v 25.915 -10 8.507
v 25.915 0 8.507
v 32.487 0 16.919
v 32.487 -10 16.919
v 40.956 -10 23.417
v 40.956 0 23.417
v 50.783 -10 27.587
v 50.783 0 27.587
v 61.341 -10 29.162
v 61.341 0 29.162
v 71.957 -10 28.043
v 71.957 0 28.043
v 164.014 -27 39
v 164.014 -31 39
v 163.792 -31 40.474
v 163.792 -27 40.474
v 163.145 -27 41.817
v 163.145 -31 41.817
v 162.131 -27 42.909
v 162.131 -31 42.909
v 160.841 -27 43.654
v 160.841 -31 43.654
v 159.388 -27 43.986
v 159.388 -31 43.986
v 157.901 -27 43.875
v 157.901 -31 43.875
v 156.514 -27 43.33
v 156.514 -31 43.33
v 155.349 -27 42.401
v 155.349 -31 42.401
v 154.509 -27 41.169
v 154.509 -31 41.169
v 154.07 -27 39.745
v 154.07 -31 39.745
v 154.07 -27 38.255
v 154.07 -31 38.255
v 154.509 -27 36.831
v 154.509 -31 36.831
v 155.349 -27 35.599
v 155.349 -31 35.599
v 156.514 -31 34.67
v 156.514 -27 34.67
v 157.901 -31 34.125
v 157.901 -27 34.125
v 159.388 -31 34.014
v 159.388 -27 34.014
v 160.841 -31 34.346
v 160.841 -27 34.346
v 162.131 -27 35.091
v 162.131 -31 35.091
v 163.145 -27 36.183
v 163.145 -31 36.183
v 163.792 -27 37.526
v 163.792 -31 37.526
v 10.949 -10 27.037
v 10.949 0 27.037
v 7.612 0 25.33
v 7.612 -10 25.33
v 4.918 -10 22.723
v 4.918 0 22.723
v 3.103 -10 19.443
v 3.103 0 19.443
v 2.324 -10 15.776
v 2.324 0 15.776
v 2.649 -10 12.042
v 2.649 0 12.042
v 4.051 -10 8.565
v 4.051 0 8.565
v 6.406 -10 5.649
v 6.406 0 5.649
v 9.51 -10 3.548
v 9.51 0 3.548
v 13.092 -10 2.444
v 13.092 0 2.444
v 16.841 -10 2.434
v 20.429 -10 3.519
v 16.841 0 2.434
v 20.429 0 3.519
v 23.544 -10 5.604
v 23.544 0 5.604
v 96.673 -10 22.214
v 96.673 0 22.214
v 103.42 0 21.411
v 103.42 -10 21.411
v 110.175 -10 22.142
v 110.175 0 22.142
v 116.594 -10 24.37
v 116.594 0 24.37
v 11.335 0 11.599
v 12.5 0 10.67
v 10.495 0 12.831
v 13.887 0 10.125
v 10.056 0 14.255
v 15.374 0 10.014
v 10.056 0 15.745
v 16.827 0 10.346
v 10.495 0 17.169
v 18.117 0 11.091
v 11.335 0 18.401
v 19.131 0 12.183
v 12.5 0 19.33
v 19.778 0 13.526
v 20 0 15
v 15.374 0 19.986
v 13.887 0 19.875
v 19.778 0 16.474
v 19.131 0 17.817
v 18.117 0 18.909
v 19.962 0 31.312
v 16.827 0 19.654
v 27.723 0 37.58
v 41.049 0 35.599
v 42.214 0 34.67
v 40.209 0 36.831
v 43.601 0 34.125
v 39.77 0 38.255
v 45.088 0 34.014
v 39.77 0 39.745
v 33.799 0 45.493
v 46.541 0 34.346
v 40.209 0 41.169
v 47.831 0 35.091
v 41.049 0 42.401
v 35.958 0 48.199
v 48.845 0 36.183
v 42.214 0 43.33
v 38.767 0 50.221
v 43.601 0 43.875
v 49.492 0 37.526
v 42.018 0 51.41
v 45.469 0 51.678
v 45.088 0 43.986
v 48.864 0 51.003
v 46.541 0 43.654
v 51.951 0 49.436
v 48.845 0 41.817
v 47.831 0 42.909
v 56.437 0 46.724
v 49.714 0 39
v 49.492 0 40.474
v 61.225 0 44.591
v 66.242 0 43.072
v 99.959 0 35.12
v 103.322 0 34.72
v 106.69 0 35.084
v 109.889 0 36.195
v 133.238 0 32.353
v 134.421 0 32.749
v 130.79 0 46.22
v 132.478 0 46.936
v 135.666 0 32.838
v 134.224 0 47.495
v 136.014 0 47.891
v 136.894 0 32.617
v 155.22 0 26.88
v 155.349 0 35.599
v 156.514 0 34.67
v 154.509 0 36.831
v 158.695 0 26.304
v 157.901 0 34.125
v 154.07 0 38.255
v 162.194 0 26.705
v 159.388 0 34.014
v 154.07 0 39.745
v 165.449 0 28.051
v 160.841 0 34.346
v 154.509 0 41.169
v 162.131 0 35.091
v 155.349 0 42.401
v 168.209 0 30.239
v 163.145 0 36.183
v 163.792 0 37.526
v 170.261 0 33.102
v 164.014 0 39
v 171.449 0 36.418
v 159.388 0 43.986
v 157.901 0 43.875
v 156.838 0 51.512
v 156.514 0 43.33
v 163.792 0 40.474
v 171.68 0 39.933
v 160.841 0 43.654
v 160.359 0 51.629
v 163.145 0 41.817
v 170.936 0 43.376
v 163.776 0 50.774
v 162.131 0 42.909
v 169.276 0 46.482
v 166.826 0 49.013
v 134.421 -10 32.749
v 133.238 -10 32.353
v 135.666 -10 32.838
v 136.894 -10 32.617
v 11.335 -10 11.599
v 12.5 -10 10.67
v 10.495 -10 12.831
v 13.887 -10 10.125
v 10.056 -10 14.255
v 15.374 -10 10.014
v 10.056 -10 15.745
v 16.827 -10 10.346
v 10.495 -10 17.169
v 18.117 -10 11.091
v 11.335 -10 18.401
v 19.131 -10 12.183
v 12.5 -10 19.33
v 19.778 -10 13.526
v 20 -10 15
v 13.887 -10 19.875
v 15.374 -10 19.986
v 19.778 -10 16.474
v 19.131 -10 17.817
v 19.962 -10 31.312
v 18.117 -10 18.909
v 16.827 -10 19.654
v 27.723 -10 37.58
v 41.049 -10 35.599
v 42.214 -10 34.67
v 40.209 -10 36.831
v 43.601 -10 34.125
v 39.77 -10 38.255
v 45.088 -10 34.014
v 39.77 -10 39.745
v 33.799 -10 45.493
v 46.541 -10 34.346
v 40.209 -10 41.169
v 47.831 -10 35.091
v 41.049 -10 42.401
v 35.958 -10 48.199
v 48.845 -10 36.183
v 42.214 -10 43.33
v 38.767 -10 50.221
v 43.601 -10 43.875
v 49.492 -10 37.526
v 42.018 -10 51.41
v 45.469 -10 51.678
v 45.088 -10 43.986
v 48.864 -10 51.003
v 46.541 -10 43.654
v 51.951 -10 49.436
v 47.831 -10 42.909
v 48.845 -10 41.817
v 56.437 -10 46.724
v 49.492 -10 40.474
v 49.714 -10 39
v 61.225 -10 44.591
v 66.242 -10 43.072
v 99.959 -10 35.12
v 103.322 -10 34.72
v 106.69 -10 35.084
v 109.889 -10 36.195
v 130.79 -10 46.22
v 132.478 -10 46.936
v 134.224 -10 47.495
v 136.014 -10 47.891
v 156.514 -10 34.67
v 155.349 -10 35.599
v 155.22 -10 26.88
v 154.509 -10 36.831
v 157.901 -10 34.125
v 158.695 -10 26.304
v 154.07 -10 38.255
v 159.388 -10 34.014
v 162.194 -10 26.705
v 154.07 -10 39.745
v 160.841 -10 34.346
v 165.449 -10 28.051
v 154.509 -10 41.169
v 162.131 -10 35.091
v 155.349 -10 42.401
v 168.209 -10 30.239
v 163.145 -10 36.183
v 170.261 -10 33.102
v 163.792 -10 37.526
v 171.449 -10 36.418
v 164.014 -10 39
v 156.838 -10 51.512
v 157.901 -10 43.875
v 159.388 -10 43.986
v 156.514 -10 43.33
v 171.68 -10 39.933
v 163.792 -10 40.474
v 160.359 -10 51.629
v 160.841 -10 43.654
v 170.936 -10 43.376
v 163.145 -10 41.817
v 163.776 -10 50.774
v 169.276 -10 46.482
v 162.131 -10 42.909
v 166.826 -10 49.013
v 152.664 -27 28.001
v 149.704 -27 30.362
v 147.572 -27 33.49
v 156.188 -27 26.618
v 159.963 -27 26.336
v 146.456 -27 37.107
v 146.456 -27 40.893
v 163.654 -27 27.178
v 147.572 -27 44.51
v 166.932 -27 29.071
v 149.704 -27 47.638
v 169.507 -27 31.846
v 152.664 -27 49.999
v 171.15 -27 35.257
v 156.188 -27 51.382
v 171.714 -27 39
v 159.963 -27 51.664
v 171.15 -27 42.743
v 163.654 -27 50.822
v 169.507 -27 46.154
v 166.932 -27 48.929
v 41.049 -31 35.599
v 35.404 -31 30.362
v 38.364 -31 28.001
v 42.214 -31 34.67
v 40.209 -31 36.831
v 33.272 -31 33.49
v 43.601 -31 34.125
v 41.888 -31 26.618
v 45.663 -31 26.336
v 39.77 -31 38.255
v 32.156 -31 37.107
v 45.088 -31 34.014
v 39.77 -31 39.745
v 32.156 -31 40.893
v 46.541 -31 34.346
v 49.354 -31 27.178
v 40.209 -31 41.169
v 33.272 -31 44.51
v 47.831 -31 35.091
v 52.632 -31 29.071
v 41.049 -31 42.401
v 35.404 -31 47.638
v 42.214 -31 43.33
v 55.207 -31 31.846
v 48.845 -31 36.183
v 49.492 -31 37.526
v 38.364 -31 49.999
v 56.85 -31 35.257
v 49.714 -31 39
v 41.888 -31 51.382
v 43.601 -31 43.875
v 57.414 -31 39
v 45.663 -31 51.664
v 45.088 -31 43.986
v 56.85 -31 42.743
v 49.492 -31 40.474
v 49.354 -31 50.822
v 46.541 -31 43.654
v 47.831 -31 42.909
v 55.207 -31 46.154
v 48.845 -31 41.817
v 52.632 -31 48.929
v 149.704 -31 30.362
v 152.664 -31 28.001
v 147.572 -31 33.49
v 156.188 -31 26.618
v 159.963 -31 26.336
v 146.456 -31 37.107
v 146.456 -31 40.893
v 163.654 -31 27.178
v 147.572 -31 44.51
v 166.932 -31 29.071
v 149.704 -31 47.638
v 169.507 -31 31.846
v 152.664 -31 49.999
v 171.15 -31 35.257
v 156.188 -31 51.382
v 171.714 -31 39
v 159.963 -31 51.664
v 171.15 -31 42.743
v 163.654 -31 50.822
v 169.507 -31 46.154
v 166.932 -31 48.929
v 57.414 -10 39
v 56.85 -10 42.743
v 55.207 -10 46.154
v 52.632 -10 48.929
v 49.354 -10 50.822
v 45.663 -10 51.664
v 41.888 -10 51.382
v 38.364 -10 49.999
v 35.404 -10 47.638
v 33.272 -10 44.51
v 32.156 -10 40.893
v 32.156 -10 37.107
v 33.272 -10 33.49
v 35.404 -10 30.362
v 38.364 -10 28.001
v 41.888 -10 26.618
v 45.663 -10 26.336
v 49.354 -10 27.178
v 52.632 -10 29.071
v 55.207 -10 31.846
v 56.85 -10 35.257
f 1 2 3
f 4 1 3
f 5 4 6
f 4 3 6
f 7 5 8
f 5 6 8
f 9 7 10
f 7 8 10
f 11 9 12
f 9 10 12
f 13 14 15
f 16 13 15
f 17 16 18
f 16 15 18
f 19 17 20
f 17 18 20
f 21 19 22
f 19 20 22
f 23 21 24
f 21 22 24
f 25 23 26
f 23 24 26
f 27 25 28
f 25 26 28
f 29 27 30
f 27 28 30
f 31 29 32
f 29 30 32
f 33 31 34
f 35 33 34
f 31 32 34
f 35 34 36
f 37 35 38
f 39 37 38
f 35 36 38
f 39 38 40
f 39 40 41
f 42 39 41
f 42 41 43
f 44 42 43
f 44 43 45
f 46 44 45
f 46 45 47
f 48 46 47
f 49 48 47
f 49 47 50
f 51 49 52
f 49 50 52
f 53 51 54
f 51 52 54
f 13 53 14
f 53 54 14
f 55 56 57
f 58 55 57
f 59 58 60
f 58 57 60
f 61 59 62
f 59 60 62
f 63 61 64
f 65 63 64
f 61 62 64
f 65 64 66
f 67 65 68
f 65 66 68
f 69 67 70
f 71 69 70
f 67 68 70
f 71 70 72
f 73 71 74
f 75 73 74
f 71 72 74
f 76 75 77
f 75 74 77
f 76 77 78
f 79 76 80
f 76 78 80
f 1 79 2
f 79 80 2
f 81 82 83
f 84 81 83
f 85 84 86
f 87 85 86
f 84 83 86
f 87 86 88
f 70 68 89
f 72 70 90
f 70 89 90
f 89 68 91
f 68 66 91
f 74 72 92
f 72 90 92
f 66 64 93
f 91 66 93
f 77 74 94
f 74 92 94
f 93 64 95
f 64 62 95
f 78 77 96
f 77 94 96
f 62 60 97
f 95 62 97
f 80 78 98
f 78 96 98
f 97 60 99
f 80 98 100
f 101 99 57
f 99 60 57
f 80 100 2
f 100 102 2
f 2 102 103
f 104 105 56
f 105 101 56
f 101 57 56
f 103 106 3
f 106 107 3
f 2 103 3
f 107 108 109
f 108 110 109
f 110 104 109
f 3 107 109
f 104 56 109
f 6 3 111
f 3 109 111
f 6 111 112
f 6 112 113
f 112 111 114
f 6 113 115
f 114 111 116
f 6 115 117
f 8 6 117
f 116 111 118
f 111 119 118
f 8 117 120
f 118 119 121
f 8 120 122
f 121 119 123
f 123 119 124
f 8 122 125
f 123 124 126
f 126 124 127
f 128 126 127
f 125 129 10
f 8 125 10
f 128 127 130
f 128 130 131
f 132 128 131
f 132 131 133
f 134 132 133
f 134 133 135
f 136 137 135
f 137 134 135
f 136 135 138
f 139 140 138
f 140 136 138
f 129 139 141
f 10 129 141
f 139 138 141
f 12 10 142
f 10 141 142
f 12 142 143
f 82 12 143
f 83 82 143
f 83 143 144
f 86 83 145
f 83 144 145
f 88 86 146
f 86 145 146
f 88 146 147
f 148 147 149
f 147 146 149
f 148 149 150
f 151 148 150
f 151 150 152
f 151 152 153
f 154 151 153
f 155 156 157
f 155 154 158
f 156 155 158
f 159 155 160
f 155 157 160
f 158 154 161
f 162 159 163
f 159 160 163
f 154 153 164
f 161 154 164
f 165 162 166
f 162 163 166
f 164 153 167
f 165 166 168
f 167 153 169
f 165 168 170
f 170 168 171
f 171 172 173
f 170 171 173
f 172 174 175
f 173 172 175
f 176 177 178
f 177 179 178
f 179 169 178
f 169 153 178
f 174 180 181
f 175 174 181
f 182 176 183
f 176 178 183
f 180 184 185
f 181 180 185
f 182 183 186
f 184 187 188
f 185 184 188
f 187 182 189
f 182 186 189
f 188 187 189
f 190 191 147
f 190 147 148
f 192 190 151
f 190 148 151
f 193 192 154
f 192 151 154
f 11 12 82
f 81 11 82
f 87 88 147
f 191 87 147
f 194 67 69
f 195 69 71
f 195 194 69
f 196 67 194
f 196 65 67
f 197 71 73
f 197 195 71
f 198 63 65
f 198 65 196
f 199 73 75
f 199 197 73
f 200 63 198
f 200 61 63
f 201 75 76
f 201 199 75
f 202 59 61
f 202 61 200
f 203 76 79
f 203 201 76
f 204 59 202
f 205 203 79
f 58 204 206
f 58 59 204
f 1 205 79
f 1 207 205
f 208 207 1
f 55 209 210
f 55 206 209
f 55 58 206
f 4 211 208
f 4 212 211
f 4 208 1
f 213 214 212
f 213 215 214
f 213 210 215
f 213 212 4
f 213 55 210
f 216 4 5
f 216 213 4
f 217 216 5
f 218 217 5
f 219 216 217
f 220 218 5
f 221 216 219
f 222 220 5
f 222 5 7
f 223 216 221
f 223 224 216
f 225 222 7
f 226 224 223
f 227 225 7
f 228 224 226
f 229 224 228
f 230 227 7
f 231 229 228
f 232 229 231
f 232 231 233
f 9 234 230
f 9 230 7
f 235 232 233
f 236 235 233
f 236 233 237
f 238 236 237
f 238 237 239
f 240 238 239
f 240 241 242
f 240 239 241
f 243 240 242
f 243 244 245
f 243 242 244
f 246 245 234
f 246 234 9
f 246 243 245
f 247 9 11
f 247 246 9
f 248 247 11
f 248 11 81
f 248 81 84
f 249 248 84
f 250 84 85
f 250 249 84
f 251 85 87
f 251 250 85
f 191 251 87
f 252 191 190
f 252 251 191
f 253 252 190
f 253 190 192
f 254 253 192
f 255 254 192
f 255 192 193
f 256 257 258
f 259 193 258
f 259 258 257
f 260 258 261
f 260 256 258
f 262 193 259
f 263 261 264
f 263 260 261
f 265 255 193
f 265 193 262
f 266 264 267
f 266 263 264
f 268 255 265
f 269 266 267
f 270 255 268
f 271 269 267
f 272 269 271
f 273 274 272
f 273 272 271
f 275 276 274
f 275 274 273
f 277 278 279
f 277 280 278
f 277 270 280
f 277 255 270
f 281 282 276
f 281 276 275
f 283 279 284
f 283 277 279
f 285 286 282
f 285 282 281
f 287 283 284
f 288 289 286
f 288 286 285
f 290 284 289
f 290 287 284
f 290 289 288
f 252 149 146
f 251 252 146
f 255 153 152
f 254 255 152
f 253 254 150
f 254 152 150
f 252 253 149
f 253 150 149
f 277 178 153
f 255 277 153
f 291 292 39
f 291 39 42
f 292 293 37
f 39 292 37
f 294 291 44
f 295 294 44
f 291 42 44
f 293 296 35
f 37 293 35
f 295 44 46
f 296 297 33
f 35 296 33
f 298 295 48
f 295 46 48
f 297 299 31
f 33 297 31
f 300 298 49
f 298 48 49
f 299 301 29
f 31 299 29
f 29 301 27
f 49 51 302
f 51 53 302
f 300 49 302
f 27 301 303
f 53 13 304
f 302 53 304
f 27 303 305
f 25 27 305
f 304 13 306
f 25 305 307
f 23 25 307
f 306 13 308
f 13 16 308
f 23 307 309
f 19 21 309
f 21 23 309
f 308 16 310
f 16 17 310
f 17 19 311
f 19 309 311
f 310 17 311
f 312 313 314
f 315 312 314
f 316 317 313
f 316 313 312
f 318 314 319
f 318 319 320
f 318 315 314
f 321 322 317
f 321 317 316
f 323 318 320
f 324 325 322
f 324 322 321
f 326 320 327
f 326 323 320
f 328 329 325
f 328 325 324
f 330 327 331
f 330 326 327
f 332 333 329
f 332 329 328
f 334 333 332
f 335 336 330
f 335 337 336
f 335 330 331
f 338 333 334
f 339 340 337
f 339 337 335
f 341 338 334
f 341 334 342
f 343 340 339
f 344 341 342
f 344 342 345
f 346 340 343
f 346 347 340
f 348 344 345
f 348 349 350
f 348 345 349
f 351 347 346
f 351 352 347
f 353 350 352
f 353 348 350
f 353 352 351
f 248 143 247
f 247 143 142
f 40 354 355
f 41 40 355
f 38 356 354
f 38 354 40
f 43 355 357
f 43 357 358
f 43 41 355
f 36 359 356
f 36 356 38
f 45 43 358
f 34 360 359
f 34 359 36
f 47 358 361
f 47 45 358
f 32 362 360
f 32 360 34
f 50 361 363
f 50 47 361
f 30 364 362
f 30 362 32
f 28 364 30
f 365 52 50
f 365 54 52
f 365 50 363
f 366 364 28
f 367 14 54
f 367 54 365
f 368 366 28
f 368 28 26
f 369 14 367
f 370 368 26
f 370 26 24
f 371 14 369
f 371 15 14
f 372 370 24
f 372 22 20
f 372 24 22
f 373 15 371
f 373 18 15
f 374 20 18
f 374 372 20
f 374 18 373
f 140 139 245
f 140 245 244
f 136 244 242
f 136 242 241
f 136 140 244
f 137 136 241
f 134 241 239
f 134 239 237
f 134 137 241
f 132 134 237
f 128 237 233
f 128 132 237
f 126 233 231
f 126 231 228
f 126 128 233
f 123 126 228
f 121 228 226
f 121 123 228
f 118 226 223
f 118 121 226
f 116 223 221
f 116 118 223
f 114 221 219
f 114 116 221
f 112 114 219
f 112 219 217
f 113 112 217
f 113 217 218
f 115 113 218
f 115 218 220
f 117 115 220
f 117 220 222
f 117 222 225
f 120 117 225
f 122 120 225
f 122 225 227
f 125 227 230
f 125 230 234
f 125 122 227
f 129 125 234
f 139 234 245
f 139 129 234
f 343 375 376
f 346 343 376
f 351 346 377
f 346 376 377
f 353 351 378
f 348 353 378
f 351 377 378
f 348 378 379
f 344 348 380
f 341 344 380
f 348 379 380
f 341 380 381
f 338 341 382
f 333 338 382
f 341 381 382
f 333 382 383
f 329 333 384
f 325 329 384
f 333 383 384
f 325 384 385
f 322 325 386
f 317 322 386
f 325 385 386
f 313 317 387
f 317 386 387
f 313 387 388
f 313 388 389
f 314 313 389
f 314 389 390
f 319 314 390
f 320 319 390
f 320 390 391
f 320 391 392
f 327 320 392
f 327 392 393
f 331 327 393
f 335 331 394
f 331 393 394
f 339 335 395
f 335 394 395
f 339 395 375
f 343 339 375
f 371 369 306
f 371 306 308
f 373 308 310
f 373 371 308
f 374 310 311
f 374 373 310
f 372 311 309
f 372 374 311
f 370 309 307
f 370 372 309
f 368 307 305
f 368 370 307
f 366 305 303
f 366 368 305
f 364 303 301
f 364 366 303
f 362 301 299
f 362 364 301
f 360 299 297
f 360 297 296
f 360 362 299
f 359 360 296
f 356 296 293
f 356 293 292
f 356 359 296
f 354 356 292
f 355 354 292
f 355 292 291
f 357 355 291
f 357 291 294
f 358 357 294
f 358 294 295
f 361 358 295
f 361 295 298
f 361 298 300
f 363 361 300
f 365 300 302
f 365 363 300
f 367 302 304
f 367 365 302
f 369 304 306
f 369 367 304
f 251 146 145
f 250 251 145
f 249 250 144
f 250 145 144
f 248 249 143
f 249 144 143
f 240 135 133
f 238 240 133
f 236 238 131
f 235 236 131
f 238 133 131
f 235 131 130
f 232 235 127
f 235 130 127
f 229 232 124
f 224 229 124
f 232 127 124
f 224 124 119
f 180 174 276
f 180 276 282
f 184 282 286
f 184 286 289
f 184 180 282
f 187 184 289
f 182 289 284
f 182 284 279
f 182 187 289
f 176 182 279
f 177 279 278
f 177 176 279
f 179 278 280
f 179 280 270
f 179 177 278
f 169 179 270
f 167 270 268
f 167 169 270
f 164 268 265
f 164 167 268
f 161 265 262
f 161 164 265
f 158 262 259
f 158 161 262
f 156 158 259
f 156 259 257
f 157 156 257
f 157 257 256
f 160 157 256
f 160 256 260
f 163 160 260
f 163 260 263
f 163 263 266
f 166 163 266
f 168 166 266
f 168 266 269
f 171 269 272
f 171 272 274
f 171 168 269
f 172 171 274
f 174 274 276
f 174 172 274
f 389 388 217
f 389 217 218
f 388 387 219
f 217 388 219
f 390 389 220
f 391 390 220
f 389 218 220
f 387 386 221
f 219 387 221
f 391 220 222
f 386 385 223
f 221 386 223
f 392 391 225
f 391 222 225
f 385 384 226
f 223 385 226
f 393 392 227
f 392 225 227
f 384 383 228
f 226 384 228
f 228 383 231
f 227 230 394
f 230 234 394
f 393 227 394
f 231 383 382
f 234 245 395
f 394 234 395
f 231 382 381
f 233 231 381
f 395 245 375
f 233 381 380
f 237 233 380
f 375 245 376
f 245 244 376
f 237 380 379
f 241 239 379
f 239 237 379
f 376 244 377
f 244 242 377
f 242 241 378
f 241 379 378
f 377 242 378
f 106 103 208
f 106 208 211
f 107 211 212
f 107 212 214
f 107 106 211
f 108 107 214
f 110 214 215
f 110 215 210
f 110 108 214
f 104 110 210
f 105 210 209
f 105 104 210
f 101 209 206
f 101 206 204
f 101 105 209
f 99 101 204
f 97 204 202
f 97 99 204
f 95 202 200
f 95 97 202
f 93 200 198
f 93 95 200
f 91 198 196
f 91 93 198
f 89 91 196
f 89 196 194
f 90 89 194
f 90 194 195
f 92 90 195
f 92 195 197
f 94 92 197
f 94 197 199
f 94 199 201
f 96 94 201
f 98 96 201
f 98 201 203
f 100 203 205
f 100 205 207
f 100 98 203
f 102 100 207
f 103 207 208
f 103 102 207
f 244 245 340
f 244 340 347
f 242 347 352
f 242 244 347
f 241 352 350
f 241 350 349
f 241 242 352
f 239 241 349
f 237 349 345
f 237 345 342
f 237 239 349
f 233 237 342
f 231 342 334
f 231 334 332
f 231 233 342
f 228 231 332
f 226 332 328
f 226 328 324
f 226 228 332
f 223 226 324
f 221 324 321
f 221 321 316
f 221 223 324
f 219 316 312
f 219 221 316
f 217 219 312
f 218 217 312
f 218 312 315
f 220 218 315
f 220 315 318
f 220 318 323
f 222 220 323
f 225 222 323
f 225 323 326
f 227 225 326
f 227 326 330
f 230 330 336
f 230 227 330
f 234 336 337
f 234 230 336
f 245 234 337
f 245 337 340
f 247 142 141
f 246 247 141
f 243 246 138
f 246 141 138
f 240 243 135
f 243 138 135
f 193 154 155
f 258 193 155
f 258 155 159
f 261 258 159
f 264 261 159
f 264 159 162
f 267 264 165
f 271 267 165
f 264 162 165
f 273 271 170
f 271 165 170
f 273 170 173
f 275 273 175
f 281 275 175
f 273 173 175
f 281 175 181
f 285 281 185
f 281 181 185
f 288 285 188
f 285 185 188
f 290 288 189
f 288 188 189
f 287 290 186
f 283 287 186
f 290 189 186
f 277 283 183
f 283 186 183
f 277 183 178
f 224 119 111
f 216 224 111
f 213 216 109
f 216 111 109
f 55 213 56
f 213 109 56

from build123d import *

# Parameters (mm, degrees)
F0_R     = 5
F3_DEPTH = 10
F2_R     = 12.7
F2_R_2   = 5
F4_DEPTH = 21
F6_R     = 12.7
F6_R_2   = 5
F7_DEPTH = 4


with BuildPart() as f3:
    # F0 (on Front) → F3 (new body)
    with BuildSketch(Plane.XZ):
        with BuildLine():
            Line((136.8938610891, 32.6169262603), (155.2197164243, 26.8800057594))
            ThreePointArc((155.2197164243, 26.8800057594), (171.6865566669, 38.1672488884), (156.838361431, 51.5122772985))
            Line((156.838361431, 51.5122772985), (136.0138882192, 47.8914976242))
            ThreePointArc((136.0138882192, 47.8914976242), (133.3445556323, 47.2356566345), (130.7903562075, 46.2200143936))
            Line((130.7903562075, 46.2200143936), (109.889352132, 36.1947521246))
            ThreePointArc((109.889352132, 36.1947521246), (105.0162276309, 34.806510773), (99.958925919, 35.1199686623))
            Line((99.958925919, 35.1199686623), (66.2424883289, 43.0719368512))
            ThreePointArc((66.2424883289, 43.0719368512), (58.7976545466, 45.5828340028), (51.9507338074, 49.436381841))
            ThreePointArc((51.9507338074, 49.436381841), (42.0175563053, 51.4104711518), (33.7989885192, 45.4926854644))
            ThreePointArc((33.7989885192, 45.4926854644), (24.0281343313, 34.2165250918), (10.948803108, 27.0365195859))
            ThreePointArc((10.948803108, 27.0365195859), (5.1202108146, 7.0200397462), (25.914918613, 8.5073463305))
            ThreePointArc((25.914918613, 8.5073463305), (45.7374582991, 25.813590453), (71.9570676896, 28.043220163))
            Line((71.9570676896, 28.043220163), (96.6726081531, 22.214099248))
            ThreePointArc((96.6726081531, 22.214099248), (106.8179730144, 21.5852768369), (116.5938631817, 24.3702036278))
            Line((116.5938631817, 24.3702036278), (133.2377030535, 32.3534976015))
            ThreePointArc((133.2377030535, 32.3534976015), (135.0407707514, 32.8323470476), (136.8938610891, 32.6169262603))
        make_face()
        with Locations((15, 15)):
            Circle(F0_R, mode=Mode.SUBTRACT)
        with Locations((44.7138882192, 39)):
            Circle(F0_R, mode=Mode.SUBTRACT)
        with Locations((159.0138882192, 39)):
            Circle(F0_R, mode=Mode.SUBTRACT)
    extrude(amount=F3_DEPTH)


with BuildPart() as f4:
    # F2 (on offset) → F4 (new body)
    with BuildSketch(Plane.XZ.offset(10)):
        with Locations((44.7138882192, 39)):
            Circle(F2_R)
        with Locations((44.7138882192, 39)):
            Circle(F2_R_2, mode=Mode.SUBTRACT)
    extrude(amount=F4_DEPTH)


with BuildPart() as f7:
    # F6 (on offset) → F7 (new body)
    with BuildSketch(Plane.XZ.offset(31)):
        with Locations((159.0138882192, 39)):
            Circle(F6_R)
        with Locations((159.0138882192, 39)):
            Circle(F6_R_2, mode=Mode.SUBTRACT)
    extrude(amount=-F7_DEPTH)


solid = Compound([f3.part, f4.part, f7.part])
